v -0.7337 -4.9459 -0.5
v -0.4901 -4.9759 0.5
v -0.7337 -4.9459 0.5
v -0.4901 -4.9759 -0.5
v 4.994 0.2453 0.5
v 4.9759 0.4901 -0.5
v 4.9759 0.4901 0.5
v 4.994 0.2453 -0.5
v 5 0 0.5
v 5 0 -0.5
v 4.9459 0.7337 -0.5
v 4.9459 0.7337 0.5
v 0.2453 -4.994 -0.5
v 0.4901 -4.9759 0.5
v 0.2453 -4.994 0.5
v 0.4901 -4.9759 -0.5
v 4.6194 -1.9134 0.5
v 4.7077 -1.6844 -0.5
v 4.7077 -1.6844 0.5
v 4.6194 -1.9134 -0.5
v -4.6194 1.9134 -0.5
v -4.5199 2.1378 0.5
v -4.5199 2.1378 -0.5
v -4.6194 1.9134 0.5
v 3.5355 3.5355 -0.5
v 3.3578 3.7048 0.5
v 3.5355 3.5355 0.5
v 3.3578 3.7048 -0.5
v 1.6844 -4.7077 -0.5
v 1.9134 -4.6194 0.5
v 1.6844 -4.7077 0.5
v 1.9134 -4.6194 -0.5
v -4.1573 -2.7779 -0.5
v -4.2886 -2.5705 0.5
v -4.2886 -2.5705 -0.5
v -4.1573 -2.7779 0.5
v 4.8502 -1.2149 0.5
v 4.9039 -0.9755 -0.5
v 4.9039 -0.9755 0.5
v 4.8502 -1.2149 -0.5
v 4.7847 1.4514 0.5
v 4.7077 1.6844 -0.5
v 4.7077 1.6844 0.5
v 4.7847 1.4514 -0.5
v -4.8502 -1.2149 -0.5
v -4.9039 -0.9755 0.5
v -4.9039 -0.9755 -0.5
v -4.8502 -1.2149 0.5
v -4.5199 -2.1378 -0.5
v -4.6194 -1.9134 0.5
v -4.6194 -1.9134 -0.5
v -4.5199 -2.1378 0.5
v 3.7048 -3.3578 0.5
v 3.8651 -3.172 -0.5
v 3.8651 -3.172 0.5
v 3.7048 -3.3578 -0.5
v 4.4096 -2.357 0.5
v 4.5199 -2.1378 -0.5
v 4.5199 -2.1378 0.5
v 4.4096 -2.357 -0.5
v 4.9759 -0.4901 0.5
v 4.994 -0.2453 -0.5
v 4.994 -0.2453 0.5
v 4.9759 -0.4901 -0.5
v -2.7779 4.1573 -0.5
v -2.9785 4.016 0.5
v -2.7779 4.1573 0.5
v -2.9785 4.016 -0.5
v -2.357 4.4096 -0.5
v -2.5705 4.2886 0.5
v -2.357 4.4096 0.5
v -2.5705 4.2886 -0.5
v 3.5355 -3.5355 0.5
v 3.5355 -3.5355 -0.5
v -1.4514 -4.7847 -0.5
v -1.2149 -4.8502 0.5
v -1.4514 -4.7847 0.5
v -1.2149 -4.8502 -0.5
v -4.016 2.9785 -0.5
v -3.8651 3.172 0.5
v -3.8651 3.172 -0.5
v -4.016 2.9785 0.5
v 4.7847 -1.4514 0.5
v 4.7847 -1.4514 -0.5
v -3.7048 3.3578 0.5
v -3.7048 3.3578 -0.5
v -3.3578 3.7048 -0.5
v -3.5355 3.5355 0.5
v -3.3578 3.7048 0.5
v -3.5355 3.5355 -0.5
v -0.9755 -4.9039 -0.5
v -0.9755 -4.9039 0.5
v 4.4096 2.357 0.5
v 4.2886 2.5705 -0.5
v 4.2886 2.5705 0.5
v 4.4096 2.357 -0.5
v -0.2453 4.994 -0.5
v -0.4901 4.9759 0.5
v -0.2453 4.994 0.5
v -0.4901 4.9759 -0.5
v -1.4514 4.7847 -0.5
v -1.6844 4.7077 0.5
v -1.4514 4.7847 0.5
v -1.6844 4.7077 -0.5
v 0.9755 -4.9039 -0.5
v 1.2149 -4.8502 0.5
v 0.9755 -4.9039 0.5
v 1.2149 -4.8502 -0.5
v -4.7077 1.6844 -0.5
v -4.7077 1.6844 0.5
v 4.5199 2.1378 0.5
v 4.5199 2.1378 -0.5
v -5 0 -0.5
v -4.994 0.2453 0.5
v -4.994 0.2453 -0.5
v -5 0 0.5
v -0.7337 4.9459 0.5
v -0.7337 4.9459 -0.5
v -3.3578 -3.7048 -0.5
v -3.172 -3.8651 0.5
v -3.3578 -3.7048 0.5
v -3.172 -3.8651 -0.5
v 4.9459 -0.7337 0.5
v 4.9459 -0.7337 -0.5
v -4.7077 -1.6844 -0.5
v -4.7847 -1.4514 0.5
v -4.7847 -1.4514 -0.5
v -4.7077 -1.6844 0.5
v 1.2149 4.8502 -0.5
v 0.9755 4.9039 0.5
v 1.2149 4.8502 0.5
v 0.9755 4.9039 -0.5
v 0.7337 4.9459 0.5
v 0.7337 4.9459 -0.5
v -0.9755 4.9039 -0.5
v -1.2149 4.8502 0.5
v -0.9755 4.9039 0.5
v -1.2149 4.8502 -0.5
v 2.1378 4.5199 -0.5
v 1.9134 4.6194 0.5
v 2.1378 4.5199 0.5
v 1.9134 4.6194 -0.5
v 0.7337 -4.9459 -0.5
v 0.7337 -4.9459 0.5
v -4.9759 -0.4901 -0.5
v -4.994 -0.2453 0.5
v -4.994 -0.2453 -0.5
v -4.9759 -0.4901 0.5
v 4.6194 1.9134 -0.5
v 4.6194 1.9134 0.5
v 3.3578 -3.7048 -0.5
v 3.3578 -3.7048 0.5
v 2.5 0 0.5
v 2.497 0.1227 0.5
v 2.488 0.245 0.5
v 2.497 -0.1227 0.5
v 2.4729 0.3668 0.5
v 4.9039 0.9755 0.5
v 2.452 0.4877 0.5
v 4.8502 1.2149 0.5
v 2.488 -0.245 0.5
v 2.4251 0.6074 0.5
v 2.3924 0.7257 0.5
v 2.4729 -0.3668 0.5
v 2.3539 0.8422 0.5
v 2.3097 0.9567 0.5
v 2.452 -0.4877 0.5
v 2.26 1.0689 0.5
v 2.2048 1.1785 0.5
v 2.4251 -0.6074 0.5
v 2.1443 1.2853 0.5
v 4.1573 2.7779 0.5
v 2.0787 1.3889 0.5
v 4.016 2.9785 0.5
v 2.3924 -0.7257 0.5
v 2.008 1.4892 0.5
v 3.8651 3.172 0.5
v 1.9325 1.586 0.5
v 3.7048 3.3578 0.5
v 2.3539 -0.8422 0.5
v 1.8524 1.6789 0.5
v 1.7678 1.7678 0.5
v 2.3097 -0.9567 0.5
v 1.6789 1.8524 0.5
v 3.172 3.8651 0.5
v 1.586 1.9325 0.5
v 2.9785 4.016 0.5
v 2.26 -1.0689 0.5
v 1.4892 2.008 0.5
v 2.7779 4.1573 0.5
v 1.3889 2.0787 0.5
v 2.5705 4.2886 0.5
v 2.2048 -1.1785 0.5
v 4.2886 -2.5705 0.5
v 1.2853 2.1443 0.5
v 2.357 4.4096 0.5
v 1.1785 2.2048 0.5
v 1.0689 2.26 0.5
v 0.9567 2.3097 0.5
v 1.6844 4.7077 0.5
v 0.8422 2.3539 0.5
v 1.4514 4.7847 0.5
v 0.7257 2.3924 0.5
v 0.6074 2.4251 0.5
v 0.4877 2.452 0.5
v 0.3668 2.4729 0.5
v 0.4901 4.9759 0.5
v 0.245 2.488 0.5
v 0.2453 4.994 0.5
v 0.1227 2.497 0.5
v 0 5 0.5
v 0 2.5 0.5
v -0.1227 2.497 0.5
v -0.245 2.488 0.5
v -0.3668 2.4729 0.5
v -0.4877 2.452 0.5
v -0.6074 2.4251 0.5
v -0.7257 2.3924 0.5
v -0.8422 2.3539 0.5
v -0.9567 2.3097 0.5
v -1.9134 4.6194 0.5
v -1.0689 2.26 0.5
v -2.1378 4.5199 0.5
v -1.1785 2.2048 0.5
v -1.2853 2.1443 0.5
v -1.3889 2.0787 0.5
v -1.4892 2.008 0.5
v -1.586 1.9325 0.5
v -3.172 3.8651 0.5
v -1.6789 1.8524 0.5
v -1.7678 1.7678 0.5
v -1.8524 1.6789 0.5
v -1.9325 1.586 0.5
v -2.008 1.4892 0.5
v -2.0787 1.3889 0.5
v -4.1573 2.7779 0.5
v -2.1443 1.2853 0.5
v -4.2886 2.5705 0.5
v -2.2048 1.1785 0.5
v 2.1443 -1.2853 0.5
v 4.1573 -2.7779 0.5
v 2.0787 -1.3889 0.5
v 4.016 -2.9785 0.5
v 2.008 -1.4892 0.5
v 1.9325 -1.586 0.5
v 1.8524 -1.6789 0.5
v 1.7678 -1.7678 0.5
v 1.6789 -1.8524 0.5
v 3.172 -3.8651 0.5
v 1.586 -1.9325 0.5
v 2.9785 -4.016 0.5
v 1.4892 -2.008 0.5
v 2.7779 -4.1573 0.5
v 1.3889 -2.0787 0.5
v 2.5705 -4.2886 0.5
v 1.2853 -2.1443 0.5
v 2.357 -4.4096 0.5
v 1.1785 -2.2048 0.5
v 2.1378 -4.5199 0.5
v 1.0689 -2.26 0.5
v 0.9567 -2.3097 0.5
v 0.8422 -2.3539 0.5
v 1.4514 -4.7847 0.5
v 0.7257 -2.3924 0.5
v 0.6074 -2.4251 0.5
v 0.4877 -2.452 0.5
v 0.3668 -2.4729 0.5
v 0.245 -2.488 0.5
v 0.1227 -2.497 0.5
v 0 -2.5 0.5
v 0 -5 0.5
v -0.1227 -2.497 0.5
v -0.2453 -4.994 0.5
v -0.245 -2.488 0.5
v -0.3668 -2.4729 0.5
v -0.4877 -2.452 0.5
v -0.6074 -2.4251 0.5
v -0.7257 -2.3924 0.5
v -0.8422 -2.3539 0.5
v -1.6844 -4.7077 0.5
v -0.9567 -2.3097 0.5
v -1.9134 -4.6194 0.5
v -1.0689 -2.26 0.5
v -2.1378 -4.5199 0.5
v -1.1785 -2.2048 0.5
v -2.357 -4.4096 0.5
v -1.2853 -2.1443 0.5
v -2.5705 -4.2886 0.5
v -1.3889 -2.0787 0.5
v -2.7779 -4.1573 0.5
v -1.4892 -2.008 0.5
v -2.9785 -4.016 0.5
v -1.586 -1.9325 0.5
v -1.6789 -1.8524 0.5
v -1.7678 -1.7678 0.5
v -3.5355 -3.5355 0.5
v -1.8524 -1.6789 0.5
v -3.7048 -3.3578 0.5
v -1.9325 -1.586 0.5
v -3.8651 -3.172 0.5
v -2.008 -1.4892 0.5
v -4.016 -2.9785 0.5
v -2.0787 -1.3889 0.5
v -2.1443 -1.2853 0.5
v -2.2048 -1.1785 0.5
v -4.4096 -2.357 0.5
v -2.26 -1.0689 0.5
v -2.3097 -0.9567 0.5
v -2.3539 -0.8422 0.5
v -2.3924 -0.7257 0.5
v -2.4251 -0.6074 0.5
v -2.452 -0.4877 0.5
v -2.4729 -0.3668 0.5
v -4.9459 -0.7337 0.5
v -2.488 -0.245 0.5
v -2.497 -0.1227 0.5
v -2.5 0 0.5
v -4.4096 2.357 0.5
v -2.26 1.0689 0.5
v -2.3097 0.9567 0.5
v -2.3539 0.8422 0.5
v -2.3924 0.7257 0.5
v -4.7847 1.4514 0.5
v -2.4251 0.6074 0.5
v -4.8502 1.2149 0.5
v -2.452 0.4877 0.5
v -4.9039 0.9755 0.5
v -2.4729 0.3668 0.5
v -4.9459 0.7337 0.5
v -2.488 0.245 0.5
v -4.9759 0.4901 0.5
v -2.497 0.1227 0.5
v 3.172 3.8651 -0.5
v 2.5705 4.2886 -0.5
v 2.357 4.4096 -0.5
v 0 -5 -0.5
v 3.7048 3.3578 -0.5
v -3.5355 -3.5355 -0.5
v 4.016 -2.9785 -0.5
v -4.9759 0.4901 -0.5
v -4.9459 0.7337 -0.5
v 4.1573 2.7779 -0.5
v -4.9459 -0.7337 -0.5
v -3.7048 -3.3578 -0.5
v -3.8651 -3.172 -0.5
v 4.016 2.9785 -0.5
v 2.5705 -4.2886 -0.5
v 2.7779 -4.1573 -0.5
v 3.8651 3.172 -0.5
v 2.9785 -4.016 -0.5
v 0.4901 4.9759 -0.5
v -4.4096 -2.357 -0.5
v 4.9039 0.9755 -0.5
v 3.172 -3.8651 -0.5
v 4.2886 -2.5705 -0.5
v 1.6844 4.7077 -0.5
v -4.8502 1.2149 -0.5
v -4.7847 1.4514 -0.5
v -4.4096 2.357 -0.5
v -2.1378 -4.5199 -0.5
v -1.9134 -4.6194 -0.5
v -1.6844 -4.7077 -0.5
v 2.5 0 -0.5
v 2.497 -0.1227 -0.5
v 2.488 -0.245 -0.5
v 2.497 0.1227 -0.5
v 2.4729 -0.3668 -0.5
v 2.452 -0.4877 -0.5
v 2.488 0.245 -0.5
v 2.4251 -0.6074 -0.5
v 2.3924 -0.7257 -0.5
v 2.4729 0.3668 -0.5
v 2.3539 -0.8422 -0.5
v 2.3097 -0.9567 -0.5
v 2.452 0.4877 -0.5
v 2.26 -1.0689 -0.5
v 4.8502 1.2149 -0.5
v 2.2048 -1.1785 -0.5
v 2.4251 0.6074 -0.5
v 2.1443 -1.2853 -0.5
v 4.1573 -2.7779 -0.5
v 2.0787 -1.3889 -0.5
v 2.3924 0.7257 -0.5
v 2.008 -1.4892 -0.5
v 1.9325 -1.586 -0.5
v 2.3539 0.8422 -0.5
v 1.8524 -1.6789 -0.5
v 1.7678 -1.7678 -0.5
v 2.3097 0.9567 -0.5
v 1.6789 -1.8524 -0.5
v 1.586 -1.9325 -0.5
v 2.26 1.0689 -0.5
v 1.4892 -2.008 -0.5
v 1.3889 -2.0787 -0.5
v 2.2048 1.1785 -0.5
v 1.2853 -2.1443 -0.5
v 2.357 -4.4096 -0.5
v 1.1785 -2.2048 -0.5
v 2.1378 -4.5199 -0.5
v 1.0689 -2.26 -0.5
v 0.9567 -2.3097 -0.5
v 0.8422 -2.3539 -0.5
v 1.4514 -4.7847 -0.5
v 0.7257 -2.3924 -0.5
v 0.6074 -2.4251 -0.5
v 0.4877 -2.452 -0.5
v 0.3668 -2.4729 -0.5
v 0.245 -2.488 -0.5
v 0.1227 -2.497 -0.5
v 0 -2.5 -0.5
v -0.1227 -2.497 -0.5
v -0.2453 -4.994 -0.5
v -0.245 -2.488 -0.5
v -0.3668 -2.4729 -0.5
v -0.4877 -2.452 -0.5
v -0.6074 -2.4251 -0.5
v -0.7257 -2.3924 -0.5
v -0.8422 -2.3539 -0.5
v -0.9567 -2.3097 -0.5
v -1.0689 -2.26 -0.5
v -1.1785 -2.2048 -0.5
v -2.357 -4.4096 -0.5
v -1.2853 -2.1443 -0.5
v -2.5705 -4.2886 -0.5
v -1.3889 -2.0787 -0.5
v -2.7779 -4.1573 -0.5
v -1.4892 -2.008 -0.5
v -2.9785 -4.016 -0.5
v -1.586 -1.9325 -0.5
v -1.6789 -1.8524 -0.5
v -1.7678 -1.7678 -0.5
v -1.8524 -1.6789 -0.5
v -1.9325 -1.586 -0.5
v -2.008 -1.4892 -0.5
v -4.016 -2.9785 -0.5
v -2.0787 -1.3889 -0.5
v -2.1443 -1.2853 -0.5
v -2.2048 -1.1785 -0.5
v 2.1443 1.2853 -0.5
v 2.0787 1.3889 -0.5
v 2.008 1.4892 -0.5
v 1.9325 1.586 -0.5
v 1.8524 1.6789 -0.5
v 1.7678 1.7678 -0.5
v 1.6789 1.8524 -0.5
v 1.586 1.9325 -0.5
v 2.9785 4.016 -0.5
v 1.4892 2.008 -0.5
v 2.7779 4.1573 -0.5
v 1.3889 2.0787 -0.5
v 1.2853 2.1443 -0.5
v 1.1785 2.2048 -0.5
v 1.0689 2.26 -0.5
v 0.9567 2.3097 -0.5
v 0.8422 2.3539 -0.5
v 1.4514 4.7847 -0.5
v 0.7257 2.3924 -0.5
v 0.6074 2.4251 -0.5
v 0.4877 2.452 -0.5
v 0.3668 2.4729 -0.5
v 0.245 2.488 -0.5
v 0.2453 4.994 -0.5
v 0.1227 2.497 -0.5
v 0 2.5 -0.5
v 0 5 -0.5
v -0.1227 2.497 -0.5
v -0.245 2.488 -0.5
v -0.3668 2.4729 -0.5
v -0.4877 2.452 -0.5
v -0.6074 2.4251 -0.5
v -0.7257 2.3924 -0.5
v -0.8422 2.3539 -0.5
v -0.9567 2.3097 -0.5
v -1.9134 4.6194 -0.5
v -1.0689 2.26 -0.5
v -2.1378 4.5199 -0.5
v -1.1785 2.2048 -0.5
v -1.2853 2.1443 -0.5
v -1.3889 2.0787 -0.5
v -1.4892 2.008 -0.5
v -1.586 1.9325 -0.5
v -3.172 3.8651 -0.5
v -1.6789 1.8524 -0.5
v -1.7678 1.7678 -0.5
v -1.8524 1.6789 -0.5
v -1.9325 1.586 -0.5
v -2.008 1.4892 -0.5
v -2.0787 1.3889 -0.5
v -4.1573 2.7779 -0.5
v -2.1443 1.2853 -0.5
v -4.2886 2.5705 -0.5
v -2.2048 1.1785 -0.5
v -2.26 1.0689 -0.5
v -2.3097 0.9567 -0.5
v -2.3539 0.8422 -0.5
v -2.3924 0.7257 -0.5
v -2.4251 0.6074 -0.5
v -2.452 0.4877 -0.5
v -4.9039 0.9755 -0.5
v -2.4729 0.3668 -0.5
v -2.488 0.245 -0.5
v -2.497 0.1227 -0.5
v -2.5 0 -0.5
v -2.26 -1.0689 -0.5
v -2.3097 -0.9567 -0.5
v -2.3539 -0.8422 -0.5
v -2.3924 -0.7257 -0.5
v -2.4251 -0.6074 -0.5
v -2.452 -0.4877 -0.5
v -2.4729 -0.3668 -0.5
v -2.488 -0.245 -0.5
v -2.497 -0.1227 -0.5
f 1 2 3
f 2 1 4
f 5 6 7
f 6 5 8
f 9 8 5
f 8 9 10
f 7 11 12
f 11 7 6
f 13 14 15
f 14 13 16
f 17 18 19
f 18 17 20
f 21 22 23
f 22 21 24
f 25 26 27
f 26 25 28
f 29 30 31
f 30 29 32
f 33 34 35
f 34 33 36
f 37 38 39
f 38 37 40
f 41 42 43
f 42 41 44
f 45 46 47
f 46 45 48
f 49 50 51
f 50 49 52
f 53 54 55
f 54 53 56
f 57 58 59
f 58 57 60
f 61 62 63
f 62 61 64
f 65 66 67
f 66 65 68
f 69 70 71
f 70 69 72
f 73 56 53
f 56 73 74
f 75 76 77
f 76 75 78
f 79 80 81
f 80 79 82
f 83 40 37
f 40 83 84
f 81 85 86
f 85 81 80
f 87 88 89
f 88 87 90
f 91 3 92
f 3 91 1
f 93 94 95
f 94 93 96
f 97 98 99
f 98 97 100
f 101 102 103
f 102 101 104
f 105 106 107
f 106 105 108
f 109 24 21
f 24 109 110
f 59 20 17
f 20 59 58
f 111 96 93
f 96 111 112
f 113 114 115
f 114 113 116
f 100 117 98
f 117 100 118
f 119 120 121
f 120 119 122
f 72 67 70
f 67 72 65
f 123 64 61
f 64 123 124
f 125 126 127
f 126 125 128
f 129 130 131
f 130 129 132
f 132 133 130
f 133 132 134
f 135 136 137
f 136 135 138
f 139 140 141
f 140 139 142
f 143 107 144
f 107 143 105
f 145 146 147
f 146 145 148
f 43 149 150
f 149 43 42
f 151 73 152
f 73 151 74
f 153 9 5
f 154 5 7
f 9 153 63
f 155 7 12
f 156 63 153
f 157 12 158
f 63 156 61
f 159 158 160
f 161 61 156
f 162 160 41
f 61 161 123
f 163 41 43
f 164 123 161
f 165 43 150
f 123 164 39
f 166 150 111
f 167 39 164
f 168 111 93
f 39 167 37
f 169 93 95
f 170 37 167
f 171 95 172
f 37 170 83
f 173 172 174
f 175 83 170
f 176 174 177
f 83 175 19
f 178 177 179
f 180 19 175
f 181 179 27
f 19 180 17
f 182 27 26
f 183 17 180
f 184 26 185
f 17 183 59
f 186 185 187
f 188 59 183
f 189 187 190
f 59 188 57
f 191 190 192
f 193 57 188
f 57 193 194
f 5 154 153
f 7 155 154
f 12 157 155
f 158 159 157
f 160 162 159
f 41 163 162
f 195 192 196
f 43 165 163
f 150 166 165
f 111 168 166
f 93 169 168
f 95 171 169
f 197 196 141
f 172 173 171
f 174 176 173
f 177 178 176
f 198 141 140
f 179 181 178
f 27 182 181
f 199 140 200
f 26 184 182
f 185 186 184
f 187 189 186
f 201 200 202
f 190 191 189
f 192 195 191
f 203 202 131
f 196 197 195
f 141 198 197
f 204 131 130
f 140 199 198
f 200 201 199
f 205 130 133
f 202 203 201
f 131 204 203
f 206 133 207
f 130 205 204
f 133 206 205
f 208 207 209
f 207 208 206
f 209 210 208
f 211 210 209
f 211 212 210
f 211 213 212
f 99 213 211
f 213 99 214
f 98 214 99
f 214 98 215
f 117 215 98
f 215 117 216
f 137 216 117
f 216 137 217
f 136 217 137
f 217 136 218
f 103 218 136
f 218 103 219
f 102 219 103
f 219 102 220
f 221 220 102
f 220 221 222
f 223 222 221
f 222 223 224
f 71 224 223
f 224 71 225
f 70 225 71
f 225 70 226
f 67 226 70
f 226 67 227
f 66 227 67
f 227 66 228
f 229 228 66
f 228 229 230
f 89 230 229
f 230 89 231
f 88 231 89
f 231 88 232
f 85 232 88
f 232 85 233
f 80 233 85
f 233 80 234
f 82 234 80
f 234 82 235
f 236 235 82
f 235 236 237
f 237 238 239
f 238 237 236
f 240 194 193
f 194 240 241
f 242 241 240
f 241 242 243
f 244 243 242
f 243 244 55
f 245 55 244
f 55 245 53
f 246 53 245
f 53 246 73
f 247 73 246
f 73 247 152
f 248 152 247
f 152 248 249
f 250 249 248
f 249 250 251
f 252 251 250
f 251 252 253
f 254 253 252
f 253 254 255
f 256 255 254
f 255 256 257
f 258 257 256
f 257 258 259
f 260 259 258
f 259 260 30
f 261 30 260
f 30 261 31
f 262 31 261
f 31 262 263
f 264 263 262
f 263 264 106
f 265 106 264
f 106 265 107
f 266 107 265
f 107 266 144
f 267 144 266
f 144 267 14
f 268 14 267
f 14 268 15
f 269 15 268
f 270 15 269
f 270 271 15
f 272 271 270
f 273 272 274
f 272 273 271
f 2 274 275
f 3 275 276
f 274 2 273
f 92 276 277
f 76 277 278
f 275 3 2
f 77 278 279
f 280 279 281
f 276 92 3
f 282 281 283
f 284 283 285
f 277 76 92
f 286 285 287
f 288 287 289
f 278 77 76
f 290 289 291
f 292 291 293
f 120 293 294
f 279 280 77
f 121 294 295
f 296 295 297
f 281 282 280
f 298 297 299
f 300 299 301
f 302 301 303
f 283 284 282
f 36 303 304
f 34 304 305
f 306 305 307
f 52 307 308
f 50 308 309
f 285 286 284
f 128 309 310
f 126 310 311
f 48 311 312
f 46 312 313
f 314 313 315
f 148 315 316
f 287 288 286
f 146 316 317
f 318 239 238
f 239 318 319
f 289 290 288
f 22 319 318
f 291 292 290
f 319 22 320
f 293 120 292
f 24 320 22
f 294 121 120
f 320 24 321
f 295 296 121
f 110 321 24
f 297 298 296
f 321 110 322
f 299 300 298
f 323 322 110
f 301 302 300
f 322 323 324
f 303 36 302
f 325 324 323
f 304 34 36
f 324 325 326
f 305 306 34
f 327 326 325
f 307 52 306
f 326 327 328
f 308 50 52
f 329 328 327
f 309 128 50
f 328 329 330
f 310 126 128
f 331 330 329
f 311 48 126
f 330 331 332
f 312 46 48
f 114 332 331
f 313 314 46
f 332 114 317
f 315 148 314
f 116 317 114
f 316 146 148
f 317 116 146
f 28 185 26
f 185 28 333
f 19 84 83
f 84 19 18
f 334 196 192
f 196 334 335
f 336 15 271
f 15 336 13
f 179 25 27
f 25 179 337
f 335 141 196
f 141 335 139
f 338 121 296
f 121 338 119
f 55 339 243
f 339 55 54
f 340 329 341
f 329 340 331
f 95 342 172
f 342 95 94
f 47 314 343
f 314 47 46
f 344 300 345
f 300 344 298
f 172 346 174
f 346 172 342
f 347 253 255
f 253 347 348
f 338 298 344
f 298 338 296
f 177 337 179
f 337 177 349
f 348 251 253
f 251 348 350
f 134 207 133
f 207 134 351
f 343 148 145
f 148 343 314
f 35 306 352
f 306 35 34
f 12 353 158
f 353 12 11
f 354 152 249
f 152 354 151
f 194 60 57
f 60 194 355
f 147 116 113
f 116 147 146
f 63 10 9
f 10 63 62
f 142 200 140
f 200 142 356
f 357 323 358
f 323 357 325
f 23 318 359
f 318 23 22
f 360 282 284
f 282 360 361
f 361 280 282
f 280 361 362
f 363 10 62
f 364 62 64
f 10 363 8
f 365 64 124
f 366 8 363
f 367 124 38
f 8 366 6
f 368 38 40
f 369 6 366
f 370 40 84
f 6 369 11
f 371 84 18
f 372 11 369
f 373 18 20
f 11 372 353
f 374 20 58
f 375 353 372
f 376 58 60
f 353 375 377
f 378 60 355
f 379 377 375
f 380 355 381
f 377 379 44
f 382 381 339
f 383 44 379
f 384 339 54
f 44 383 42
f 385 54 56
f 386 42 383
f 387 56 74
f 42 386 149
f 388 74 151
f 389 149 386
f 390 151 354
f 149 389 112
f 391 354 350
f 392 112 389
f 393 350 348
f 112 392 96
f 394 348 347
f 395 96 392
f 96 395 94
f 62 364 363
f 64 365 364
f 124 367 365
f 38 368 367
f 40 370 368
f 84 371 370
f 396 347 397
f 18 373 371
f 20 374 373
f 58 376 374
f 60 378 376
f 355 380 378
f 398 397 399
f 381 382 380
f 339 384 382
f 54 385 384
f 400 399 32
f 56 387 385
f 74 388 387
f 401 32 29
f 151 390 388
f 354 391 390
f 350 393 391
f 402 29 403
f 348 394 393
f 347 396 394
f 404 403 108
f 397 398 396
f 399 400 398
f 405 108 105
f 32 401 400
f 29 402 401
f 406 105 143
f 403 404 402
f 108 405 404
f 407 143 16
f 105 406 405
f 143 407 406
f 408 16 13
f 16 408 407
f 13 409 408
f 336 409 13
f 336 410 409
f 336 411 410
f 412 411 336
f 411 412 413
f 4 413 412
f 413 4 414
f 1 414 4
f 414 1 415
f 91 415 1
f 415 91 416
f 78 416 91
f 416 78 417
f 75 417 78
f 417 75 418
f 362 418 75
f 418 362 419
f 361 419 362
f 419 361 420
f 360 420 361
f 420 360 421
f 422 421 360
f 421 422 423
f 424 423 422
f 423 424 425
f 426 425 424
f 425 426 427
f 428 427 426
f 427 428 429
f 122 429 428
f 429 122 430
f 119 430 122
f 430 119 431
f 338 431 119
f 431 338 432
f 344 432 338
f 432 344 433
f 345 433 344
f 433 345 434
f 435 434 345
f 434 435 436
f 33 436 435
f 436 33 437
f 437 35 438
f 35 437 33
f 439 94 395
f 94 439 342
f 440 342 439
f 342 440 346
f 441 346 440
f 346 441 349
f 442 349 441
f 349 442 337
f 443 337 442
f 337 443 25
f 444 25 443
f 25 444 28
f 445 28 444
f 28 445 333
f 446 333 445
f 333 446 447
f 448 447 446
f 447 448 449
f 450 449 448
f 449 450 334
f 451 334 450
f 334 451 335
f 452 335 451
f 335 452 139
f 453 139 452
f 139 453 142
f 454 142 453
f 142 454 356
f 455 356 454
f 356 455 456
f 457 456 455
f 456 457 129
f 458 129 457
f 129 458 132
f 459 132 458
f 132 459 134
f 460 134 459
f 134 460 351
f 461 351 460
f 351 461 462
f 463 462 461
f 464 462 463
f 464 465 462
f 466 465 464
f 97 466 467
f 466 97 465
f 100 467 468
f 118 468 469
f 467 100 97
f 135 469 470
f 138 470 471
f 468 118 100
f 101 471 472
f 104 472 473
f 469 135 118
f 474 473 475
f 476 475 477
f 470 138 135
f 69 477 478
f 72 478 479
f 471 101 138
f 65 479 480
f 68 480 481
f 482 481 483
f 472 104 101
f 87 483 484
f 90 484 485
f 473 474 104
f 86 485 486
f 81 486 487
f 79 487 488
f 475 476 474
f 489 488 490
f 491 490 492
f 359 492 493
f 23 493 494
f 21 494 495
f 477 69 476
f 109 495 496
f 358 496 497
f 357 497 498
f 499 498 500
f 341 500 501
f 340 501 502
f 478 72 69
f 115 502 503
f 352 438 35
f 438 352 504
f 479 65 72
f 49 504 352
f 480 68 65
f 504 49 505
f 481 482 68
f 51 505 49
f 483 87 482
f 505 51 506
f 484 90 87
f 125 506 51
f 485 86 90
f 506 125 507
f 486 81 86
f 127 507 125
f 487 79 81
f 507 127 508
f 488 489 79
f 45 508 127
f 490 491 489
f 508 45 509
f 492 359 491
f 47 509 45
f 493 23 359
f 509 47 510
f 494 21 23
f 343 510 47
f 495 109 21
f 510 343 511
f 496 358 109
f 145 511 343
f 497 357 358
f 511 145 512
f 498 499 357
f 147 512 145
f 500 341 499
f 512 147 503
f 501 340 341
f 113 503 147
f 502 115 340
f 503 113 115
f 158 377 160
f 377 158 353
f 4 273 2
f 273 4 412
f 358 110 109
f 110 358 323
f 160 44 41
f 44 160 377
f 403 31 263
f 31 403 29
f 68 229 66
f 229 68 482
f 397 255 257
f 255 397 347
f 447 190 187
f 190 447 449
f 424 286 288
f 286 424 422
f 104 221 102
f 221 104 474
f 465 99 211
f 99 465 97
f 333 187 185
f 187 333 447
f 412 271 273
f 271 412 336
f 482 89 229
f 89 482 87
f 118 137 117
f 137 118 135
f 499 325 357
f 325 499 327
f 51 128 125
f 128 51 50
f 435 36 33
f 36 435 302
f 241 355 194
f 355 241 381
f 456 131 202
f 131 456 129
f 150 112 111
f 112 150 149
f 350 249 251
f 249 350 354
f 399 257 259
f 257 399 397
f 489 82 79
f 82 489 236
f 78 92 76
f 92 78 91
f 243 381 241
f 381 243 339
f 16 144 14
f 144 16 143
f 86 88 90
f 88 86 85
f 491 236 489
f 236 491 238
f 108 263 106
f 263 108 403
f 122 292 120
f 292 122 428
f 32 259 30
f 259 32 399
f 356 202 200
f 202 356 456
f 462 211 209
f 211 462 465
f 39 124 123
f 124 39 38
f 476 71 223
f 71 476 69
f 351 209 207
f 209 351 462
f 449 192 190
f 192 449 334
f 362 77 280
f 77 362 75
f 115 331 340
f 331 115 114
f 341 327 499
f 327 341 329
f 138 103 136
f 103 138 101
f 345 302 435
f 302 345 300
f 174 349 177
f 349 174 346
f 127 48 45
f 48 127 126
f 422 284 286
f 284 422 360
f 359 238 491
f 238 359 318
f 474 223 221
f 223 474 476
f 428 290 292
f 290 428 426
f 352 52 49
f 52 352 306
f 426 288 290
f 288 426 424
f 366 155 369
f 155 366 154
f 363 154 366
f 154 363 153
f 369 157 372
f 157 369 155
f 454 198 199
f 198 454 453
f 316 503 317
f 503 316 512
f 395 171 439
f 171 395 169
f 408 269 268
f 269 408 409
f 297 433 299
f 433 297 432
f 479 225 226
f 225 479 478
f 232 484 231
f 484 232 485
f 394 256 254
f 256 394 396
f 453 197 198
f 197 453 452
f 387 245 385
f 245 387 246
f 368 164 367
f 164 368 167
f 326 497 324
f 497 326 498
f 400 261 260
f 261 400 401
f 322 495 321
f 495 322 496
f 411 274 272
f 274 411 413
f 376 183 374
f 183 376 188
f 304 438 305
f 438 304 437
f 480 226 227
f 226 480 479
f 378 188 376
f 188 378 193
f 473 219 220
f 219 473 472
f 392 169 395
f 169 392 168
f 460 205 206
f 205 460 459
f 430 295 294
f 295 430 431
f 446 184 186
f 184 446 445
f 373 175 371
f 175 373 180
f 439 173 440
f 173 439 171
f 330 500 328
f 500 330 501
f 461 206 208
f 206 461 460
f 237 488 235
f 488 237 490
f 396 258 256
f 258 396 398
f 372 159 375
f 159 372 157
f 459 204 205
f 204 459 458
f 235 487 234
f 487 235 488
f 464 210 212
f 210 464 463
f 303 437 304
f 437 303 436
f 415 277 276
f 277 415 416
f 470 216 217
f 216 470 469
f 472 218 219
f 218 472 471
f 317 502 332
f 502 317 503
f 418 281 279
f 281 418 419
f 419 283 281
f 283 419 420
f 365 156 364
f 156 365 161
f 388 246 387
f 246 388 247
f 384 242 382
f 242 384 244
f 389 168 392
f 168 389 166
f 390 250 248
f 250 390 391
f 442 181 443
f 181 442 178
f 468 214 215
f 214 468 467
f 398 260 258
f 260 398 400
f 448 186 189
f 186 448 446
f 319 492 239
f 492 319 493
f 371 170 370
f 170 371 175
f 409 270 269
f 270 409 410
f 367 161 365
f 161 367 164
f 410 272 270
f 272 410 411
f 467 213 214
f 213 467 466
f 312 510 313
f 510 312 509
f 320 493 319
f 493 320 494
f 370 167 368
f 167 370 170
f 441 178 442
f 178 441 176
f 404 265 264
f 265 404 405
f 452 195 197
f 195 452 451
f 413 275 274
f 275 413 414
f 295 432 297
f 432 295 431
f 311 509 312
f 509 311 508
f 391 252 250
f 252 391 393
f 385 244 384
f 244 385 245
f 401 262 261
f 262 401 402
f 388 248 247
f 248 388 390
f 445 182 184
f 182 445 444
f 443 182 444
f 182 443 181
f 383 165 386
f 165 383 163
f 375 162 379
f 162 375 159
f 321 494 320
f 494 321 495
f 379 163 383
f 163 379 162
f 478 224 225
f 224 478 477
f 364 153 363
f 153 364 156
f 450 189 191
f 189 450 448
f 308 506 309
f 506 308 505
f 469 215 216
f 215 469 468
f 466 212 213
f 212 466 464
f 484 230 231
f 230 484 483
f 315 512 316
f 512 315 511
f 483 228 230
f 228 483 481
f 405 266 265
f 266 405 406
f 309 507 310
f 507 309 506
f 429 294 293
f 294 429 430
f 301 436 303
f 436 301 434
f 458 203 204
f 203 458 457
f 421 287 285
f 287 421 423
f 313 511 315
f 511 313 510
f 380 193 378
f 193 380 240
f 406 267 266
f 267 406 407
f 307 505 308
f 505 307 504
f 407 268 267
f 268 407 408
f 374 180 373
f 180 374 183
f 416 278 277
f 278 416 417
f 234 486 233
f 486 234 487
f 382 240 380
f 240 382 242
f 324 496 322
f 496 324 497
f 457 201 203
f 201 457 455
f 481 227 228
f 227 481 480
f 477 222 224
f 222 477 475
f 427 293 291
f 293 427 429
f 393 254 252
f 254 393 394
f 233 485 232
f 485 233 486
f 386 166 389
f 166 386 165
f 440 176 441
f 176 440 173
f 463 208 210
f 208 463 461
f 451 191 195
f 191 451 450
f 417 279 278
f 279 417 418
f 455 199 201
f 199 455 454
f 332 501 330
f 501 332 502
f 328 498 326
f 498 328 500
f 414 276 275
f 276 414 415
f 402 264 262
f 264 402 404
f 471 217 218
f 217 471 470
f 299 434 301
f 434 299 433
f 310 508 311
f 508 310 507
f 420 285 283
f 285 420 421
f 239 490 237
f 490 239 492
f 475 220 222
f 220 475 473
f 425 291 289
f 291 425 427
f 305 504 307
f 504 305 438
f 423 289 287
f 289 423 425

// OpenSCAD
// Flat washer: 5.0mm ID, 10.0mm OD, 1.0mm thickness

inner_diameter_mm = 5.0;   //[2.5:10.0:0.1]
outer_diameter_mm = 10.0;  //[5.0:20.0:0.1]
thickness_mm      = 1.0;   //[0.5:2.0:0.1]
eps_mm            = 0.2;   //[0.01:1.0:0.01]

$fn = 128;

module washer(id_mm, od_mm, t_mm, eps=0.2) {
    difference() {
        cylinder(d=od_mm, h=t_mm, center=true);
        cylinder(d=id_mm, h=t_mm + 2*eps, center=true);
    }
}

washer(inner_diameter_mm, outer_diameter_mm, thickness_mm, eps_mm);
